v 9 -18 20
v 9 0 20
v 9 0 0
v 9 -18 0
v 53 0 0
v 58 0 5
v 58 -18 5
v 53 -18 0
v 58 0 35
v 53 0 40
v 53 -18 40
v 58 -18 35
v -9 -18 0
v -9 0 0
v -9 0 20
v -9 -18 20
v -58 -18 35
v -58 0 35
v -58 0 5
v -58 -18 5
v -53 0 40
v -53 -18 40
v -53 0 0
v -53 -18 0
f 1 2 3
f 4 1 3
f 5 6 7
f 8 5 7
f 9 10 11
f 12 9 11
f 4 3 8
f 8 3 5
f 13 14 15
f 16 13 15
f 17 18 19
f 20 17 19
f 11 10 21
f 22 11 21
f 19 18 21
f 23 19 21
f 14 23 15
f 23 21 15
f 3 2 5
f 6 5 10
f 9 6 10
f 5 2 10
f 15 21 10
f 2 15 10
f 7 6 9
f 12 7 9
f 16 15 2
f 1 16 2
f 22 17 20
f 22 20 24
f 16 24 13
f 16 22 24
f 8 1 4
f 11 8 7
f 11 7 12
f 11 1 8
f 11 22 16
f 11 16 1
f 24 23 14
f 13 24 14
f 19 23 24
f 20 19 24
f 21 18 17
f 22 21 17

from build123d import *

# Parameters (mm, degrees)
F1_DEPTH = 18
F2_SIZE  = 5


with BuildPart() as f1:
    # F0 (on Front) → F1 (new body)
    with BuildSketch(Plane.XZ):
        Polygon((-9, 0), (-9, 20), (9, 20), (9, 0), (58, 0), (58, 40), (-58, 40), (-58, 0), align=None)
    extrude(amount=F1_DEPTH)

    # F2
    f2_edges = [f1.edges().sort_by_distance(p)[0] for p in [
        (-58, -9, 0),
        (58, -9, 0),
        (58, -9, 40),
        (-58, -9, 40),
    ]]
    chamfer(f2_edges, length=F2_SIZE)


solid = f1.part
